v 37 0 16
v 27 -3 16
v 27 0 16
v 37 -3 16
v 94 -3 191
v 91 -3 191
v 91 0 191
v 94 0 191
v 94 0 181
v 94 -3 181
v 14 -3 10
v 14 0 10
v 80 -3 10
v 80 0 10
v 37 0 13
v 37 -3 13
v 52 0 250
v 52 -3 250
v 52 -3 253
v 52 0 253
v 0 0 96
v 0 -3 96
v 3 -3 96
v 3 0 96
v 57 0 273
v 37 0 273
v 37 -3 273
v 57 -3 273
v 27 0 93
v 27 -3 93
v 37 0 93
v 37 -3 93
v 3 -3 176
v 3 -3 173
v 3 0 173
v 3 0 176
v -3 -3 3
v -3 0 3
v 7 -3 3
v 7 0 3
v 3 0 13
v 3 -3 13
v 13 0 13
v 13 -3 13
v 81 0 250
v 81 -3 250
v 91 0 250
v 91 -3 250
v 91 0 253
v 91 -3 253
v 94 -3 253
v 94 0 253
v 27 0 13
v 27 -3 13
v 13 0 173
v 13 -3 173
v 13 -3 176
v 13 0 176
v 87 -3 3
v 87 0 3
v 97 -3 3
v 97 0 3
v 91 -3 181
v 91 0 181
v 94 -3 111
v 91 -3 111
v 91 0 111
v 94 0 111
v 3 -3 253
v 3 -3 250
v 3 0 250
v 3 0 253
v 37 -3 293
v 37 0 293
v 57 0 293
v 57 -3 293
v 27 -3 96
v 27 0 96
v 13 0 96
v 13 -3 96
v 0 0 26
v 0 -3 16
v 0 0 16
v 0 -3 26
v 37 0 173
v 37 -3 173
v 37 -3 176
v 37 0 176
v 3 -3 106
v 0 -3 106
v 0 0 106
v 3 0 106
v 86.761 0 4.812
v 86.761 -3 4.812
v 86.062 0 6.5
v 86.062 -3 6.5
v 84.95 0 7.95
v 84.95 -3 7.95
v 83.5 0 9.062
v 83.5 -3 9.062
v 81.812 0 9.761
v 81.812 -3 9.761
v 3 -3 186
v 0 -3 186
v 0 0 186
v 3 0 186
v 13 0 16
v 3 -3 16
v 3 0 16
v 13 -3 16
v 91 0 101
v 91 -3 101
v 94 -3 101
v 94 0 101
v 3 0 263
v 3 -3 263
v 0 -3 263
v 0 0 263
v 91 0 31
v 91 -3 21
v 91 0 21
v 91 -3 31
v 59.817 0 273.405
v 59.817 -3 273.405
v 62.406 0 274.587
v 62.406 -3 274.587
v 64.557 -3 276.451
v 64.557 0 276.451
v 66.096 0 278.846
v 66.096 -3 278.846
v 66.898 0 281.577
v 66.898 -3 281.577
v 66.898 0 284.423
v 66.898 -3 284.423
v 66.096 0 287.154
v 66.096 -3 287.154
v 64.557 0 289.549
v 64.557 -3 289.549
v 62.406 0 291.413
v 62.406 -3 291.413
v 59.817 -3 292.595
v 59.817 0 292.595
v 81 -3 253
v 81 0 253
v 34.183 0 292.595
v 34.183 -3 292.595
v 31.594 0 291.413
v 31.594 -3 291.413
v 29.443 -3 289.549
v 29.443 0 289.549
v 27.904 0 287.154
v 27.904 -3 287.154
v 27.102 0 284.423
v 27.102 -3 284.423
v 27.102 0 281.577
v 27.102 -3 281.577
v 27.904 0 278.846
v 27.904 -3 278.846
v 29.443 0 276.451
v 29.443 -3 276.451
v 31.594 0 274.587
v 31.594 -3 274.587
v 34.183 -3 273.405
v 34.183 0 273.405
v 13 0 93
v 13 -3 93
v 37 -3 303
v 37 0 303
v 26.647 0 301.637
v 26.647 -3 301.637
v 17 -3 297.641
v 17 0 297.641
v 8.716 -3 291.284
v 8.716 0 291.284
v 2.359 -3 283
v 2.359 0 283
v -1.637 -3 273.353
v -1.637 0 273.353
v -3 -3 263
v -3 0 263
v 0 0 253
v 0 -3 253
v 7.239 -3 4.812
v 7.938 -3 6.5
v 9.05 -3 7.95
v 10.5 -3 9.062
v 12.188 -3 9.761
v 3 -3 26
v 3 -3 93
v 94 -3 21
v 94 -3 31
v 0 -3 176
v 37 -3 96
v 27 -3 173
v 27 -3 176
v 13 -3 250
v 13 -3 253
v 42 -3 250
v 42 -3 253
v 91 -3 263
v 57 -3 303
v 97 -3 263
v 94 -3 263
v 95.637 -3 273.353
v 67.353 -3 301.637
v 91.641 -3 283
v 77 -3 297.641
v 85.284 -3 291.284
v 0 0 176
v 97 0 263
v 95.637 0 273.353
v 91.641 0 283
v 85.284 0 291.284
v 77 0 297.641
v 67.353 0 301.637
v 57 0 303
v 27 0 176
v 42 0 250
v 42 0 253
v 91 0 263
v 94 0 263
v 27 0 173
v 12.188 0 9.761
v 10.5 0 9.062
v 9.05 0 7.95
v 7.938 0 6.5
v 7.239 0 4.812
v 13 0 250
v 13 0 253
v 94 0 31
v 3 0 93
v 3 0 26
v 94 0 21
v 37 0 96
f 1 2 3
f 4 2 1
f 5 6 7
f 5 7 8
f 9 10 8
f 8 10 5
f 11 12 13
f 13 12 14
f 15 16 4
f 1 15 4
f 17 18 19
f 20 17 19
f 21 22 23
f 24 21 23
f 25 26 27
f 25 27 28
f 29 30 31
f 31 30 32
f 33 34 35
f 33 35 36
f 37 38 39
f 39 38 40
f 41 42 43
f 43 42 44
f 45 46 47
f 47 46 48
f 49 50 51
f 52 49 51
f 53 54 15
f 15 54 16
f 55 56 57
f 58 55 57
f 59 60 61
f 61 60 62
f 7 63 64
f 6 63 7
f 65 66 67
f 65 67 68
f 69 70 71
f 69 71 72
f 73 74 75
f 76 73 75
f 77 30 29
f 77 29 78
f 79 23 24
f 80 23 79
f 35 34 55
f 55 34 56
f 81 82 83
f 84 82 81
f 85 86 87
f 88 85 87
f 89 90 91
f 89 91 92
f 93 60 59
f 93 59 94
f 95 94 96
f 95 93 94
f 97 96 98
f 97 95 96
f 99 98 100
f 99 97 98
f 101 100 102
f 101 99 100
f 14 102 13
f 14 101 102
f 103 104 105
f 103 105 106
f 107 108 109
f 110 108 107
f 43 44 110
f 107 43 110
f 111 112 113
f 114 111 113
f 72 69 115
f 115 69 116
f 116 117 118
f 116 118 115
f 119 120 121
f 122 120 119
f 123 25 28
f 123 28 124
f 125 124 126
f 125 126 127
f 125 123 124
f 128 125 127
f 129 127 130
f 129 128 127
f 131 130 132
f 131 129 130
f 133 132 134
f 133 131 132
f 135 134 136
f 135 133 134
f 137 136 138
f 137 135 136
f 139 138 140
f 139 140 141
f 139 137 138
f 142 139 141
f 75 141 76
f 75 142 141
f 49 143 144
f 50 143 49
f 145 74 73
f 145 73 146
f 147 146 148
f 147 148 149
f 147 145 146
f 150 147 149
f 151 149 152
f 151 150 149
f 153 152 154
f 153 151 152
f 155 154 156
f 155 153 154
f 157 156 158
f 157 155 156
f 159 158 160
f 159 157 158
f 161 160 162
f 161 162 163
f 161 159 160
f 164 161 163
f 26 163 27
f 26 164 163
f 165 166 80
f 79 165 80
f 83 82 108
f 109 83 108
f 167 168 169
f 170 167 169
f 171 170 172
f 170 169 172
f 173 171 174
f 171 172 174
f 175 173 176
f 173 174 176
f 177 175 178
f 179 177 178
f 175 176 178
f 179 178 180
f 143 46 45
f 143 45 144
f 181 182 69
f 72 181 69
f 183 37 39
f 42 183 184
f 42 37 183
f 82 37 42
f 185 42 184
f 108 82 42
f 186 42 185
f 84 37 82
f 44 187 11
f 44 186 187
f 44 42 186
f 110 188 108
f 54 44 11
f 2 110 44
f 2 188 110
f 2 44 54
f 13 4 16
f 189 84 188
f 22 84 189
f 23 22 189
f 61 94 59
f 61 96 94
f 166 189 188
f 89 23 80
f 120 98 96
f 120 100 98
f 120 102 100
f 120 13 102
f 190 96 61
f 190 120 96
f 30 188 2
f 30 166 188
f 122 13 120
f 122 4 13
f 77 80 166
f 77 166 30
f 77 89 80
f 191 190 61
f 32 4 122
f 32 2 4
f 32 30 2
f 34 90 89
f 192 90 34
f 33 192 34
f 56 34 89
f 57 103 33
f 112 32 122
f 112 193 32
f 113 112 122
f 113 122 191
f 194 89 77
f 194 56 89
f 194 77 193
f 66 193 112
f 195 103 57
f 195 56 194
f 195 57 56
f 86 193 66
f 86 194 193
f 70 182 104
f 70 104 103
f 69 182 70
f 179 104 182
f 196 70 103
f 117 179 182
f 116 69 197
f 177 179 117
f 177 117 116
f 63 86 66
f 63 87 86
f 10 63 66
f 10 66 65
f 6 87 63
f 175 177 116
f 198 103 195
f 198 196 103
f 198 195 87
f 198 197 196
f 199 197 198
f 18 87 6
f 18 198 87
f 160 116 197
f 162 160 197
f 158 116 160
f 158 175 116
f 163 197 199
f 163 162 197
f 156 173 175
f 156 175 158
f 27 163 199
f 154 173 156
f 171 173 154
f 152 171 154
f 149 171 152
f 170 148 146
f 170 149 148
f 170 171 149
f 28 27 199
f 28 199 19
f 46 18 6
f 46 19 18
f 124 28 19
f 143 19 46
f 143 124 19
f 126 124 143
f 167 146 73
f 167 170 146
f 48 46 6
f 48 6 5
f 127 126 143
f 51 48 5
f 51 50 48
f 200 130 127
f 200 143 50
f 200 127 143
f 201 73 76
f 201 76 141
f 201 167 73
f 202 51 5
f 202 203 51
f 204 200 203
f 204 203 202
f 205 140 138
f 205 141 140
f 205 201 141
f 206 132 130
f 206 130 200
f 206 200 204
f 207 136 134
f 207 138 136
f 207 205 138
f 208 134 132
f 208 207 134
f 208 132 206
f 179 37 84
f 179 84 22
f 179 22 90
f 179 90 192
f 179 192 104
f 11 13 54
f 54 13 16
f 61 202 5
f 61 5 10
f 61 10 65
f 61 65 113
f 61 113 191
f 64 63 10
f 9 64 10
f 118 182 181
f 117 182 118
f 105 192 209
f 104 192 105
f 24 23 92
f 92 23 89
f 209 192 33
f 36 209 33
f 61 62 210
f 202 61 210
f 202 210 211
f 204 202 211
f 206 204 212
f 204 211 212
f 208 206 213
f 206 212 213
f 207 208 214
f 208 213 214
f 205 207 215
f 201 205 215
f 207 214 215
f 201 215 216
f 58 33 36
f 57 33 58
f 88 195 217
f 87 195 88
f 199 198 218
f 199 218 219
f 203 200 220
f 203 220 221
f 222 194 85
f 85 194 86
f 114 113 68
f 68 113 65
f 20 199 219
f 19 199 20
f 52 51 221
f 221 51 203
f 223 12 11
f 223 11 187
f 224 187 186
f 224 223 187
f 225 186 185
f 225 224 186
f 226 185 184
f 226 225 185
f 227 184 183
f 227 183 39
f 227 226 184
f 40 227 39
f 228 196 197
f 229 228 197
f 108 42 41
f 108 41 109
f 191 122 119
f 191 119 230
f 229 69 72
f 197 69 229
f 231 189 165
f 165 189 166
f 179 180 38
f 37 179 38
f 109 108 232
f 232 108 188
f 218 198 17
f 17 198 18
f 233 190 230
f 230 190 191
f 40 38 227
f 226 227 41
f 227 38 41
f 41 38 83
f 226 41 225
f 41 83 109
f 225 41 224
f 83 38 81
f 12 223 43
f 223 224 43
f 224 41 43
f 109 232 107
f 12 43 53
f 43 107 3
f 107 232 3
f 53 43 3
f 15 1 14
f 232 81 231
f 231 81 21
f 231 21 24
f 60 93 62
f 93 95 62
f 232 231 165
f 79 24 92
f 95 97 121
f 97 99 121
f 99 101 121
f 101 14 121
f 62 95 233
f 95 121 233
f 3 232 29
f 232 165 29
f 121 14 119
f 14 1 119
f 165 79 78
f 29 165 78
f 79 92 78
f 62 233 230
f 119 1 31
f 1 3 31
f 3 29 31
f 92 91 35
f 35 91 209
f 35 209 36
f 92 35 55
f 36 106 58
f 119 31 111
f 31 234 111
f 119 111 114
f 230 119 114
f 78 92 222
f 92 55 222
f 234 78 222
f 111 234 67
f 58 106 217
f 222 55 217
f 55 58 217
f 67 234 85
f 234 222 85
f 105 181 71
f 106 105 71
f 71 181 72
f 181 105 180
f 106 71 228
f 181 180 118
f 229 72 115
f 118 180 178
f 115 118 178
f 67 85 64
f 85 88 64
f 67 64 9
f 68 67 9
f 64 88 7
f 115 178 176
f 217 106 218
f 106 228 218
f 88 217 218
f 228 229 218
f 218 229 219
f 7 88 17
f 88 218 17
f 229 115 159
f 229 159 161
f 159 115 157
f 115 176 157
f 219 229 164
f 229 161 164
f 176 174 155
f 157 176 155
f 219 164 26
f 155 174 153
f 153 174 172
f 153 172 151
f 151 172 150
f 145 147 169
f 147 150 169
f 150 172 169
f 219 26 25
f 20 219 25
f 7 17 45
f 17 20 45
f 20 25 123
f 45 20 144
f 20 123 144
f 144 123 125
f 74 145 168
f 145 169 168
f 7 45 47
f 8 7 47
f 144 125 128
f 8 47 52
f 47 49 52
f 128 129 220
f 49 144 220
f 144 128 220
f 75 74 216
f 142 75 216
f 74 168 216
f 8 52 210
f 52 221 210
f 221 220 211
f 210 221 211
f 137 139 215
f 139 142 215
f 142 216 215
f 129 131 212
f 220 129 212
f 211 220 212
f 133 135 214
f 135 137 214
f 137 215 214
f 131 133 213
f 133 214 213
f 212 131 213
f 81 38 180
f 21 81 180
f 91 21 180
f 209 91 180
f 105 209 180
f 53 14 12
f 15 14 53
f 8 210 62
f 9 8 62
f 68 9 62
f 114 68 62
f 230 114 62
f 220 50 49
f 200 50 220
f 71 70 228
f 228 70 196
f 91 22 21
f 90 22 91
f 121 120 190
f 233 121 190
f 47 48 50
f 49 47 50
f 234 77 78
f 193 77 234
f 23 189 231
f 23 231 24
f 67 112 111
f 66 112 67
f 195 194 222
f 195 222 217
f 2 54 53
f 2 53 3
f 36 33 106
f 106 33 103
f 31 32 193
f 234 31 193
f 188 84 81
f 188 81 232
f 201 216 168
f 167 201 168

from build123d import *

# Parameters (mm, degrees)
PAD005_DEPTH           = 3
SKETCH009_W            = 3
SKETCH009_H            = 10
SKETCH009_W_2          = 10
SKETCH009_H_2          = 3
POCKET003_DEPTH        = 3
LINEARPATTERN003_COUNT = 3
LINEARPATTERN003_PITCH = 80
SKETCH011_W            = 10
SKETCH011_H            = 3
SKETCH011_W_2          = 3
SKETCH011_H_2          = 10
POCKET004_DEPTH        = 3


with BuildPart() as part:
    # Sketch008 → Pad005 (new body)
    with BuildSketch(Plane.XZ):
        with BuildLine():
            Line((-3, 260), (-3, 0))
            Line((-3, 0), (7, 0))
            ThreePointArc((14, 7), (9.050253, 4.949747), (7, 0))
            Line((14, 7), (80, 7))
            ThreePointArc((87, 0), (84.949747, 4.949747), (80, 7))
            Line((87, 0), (97, 0))
            Line((97, 0), (97, 260))
            ThreePointArc((97, 260), (85.284271, 288.284271), (57, 300))
            Line((57, 300), (37, 300))
            ThreePointArc((37, 300), (8.715729, 288.284271), (-3, 260))
        make_face()
        with BuildLine():
            ThreePointArc((37, 290), (27, 280), (37, 270))
            Line((37, 270), (57, 270))
            ThreePointArc((57, 270), (67, 280), (57, 290))
            Line((37, 290), (57, 290))
        make_face(mode=Mode.SUBTRACT)
    extrude(amount=PAD005_DEPTH)

    # Sketch009 → Pocket003 (cut)
    with BuildSketch(Plane.XZ.offset(3)):
        with Locations((1.5, 18)):
            Rectangle(SKETCH009_W, SKETCH009_H)
        with Locations((8, 11.5)):
            Rectangle(SKETCH009_W_2, SKETCH009_H_2)
        with Locations((32, 11.5)):
            Rectangle(SKETCH009_W_2, SKETCH009_H_2)
        with Locations((92.5, 23)):
            Rectangle(SKETCH009_W, SKETCH009_H)
    pocket003 = extrude(amount=-POCKET003_DEPTH, mode=Mode.SUBTRACT)

    # LinearPattern003: Pocket003 ×3
    with Locations(*[(0, 0, i * LINEARPATTERN003_PITCH) for i in range(1, LINEARPATTERN003_COUNT)]):
        add(pocket003, mode=Mode.SUBTRACT)

    # Sketch011 → Pocket004 (cut)
    with BuildSketch(Plane.XZ.offset(3)):
        with Locations((8, 248.5)):
            Rectangle(SKETCH011_W, SKETCH011_H)
        with Locations((47, 248.5)):
            Rectangle(SKETCH011_W, SKETCH011_H)
        with Locations((86, 248.5)):
            Rectangle(SKETCH011_W, SKETCH011_H)
        with Locations((1.5, 255)):
            Rectangle(SKETCH011_W_2, SKETCH011_H_2)
        with Locations((92.5, 255)):
            Rectangle(SKETCH011_W_2, SKETCH011_H_2)
    extrude(amount=-POCKET004_DEPTH, mode=Mode.SUBTRACT)


with BuildPart() as part_1:
    # Body005 placement: moved
    add(part.part.moved(Location((0, 0, 3))))


solid = part_1.part
